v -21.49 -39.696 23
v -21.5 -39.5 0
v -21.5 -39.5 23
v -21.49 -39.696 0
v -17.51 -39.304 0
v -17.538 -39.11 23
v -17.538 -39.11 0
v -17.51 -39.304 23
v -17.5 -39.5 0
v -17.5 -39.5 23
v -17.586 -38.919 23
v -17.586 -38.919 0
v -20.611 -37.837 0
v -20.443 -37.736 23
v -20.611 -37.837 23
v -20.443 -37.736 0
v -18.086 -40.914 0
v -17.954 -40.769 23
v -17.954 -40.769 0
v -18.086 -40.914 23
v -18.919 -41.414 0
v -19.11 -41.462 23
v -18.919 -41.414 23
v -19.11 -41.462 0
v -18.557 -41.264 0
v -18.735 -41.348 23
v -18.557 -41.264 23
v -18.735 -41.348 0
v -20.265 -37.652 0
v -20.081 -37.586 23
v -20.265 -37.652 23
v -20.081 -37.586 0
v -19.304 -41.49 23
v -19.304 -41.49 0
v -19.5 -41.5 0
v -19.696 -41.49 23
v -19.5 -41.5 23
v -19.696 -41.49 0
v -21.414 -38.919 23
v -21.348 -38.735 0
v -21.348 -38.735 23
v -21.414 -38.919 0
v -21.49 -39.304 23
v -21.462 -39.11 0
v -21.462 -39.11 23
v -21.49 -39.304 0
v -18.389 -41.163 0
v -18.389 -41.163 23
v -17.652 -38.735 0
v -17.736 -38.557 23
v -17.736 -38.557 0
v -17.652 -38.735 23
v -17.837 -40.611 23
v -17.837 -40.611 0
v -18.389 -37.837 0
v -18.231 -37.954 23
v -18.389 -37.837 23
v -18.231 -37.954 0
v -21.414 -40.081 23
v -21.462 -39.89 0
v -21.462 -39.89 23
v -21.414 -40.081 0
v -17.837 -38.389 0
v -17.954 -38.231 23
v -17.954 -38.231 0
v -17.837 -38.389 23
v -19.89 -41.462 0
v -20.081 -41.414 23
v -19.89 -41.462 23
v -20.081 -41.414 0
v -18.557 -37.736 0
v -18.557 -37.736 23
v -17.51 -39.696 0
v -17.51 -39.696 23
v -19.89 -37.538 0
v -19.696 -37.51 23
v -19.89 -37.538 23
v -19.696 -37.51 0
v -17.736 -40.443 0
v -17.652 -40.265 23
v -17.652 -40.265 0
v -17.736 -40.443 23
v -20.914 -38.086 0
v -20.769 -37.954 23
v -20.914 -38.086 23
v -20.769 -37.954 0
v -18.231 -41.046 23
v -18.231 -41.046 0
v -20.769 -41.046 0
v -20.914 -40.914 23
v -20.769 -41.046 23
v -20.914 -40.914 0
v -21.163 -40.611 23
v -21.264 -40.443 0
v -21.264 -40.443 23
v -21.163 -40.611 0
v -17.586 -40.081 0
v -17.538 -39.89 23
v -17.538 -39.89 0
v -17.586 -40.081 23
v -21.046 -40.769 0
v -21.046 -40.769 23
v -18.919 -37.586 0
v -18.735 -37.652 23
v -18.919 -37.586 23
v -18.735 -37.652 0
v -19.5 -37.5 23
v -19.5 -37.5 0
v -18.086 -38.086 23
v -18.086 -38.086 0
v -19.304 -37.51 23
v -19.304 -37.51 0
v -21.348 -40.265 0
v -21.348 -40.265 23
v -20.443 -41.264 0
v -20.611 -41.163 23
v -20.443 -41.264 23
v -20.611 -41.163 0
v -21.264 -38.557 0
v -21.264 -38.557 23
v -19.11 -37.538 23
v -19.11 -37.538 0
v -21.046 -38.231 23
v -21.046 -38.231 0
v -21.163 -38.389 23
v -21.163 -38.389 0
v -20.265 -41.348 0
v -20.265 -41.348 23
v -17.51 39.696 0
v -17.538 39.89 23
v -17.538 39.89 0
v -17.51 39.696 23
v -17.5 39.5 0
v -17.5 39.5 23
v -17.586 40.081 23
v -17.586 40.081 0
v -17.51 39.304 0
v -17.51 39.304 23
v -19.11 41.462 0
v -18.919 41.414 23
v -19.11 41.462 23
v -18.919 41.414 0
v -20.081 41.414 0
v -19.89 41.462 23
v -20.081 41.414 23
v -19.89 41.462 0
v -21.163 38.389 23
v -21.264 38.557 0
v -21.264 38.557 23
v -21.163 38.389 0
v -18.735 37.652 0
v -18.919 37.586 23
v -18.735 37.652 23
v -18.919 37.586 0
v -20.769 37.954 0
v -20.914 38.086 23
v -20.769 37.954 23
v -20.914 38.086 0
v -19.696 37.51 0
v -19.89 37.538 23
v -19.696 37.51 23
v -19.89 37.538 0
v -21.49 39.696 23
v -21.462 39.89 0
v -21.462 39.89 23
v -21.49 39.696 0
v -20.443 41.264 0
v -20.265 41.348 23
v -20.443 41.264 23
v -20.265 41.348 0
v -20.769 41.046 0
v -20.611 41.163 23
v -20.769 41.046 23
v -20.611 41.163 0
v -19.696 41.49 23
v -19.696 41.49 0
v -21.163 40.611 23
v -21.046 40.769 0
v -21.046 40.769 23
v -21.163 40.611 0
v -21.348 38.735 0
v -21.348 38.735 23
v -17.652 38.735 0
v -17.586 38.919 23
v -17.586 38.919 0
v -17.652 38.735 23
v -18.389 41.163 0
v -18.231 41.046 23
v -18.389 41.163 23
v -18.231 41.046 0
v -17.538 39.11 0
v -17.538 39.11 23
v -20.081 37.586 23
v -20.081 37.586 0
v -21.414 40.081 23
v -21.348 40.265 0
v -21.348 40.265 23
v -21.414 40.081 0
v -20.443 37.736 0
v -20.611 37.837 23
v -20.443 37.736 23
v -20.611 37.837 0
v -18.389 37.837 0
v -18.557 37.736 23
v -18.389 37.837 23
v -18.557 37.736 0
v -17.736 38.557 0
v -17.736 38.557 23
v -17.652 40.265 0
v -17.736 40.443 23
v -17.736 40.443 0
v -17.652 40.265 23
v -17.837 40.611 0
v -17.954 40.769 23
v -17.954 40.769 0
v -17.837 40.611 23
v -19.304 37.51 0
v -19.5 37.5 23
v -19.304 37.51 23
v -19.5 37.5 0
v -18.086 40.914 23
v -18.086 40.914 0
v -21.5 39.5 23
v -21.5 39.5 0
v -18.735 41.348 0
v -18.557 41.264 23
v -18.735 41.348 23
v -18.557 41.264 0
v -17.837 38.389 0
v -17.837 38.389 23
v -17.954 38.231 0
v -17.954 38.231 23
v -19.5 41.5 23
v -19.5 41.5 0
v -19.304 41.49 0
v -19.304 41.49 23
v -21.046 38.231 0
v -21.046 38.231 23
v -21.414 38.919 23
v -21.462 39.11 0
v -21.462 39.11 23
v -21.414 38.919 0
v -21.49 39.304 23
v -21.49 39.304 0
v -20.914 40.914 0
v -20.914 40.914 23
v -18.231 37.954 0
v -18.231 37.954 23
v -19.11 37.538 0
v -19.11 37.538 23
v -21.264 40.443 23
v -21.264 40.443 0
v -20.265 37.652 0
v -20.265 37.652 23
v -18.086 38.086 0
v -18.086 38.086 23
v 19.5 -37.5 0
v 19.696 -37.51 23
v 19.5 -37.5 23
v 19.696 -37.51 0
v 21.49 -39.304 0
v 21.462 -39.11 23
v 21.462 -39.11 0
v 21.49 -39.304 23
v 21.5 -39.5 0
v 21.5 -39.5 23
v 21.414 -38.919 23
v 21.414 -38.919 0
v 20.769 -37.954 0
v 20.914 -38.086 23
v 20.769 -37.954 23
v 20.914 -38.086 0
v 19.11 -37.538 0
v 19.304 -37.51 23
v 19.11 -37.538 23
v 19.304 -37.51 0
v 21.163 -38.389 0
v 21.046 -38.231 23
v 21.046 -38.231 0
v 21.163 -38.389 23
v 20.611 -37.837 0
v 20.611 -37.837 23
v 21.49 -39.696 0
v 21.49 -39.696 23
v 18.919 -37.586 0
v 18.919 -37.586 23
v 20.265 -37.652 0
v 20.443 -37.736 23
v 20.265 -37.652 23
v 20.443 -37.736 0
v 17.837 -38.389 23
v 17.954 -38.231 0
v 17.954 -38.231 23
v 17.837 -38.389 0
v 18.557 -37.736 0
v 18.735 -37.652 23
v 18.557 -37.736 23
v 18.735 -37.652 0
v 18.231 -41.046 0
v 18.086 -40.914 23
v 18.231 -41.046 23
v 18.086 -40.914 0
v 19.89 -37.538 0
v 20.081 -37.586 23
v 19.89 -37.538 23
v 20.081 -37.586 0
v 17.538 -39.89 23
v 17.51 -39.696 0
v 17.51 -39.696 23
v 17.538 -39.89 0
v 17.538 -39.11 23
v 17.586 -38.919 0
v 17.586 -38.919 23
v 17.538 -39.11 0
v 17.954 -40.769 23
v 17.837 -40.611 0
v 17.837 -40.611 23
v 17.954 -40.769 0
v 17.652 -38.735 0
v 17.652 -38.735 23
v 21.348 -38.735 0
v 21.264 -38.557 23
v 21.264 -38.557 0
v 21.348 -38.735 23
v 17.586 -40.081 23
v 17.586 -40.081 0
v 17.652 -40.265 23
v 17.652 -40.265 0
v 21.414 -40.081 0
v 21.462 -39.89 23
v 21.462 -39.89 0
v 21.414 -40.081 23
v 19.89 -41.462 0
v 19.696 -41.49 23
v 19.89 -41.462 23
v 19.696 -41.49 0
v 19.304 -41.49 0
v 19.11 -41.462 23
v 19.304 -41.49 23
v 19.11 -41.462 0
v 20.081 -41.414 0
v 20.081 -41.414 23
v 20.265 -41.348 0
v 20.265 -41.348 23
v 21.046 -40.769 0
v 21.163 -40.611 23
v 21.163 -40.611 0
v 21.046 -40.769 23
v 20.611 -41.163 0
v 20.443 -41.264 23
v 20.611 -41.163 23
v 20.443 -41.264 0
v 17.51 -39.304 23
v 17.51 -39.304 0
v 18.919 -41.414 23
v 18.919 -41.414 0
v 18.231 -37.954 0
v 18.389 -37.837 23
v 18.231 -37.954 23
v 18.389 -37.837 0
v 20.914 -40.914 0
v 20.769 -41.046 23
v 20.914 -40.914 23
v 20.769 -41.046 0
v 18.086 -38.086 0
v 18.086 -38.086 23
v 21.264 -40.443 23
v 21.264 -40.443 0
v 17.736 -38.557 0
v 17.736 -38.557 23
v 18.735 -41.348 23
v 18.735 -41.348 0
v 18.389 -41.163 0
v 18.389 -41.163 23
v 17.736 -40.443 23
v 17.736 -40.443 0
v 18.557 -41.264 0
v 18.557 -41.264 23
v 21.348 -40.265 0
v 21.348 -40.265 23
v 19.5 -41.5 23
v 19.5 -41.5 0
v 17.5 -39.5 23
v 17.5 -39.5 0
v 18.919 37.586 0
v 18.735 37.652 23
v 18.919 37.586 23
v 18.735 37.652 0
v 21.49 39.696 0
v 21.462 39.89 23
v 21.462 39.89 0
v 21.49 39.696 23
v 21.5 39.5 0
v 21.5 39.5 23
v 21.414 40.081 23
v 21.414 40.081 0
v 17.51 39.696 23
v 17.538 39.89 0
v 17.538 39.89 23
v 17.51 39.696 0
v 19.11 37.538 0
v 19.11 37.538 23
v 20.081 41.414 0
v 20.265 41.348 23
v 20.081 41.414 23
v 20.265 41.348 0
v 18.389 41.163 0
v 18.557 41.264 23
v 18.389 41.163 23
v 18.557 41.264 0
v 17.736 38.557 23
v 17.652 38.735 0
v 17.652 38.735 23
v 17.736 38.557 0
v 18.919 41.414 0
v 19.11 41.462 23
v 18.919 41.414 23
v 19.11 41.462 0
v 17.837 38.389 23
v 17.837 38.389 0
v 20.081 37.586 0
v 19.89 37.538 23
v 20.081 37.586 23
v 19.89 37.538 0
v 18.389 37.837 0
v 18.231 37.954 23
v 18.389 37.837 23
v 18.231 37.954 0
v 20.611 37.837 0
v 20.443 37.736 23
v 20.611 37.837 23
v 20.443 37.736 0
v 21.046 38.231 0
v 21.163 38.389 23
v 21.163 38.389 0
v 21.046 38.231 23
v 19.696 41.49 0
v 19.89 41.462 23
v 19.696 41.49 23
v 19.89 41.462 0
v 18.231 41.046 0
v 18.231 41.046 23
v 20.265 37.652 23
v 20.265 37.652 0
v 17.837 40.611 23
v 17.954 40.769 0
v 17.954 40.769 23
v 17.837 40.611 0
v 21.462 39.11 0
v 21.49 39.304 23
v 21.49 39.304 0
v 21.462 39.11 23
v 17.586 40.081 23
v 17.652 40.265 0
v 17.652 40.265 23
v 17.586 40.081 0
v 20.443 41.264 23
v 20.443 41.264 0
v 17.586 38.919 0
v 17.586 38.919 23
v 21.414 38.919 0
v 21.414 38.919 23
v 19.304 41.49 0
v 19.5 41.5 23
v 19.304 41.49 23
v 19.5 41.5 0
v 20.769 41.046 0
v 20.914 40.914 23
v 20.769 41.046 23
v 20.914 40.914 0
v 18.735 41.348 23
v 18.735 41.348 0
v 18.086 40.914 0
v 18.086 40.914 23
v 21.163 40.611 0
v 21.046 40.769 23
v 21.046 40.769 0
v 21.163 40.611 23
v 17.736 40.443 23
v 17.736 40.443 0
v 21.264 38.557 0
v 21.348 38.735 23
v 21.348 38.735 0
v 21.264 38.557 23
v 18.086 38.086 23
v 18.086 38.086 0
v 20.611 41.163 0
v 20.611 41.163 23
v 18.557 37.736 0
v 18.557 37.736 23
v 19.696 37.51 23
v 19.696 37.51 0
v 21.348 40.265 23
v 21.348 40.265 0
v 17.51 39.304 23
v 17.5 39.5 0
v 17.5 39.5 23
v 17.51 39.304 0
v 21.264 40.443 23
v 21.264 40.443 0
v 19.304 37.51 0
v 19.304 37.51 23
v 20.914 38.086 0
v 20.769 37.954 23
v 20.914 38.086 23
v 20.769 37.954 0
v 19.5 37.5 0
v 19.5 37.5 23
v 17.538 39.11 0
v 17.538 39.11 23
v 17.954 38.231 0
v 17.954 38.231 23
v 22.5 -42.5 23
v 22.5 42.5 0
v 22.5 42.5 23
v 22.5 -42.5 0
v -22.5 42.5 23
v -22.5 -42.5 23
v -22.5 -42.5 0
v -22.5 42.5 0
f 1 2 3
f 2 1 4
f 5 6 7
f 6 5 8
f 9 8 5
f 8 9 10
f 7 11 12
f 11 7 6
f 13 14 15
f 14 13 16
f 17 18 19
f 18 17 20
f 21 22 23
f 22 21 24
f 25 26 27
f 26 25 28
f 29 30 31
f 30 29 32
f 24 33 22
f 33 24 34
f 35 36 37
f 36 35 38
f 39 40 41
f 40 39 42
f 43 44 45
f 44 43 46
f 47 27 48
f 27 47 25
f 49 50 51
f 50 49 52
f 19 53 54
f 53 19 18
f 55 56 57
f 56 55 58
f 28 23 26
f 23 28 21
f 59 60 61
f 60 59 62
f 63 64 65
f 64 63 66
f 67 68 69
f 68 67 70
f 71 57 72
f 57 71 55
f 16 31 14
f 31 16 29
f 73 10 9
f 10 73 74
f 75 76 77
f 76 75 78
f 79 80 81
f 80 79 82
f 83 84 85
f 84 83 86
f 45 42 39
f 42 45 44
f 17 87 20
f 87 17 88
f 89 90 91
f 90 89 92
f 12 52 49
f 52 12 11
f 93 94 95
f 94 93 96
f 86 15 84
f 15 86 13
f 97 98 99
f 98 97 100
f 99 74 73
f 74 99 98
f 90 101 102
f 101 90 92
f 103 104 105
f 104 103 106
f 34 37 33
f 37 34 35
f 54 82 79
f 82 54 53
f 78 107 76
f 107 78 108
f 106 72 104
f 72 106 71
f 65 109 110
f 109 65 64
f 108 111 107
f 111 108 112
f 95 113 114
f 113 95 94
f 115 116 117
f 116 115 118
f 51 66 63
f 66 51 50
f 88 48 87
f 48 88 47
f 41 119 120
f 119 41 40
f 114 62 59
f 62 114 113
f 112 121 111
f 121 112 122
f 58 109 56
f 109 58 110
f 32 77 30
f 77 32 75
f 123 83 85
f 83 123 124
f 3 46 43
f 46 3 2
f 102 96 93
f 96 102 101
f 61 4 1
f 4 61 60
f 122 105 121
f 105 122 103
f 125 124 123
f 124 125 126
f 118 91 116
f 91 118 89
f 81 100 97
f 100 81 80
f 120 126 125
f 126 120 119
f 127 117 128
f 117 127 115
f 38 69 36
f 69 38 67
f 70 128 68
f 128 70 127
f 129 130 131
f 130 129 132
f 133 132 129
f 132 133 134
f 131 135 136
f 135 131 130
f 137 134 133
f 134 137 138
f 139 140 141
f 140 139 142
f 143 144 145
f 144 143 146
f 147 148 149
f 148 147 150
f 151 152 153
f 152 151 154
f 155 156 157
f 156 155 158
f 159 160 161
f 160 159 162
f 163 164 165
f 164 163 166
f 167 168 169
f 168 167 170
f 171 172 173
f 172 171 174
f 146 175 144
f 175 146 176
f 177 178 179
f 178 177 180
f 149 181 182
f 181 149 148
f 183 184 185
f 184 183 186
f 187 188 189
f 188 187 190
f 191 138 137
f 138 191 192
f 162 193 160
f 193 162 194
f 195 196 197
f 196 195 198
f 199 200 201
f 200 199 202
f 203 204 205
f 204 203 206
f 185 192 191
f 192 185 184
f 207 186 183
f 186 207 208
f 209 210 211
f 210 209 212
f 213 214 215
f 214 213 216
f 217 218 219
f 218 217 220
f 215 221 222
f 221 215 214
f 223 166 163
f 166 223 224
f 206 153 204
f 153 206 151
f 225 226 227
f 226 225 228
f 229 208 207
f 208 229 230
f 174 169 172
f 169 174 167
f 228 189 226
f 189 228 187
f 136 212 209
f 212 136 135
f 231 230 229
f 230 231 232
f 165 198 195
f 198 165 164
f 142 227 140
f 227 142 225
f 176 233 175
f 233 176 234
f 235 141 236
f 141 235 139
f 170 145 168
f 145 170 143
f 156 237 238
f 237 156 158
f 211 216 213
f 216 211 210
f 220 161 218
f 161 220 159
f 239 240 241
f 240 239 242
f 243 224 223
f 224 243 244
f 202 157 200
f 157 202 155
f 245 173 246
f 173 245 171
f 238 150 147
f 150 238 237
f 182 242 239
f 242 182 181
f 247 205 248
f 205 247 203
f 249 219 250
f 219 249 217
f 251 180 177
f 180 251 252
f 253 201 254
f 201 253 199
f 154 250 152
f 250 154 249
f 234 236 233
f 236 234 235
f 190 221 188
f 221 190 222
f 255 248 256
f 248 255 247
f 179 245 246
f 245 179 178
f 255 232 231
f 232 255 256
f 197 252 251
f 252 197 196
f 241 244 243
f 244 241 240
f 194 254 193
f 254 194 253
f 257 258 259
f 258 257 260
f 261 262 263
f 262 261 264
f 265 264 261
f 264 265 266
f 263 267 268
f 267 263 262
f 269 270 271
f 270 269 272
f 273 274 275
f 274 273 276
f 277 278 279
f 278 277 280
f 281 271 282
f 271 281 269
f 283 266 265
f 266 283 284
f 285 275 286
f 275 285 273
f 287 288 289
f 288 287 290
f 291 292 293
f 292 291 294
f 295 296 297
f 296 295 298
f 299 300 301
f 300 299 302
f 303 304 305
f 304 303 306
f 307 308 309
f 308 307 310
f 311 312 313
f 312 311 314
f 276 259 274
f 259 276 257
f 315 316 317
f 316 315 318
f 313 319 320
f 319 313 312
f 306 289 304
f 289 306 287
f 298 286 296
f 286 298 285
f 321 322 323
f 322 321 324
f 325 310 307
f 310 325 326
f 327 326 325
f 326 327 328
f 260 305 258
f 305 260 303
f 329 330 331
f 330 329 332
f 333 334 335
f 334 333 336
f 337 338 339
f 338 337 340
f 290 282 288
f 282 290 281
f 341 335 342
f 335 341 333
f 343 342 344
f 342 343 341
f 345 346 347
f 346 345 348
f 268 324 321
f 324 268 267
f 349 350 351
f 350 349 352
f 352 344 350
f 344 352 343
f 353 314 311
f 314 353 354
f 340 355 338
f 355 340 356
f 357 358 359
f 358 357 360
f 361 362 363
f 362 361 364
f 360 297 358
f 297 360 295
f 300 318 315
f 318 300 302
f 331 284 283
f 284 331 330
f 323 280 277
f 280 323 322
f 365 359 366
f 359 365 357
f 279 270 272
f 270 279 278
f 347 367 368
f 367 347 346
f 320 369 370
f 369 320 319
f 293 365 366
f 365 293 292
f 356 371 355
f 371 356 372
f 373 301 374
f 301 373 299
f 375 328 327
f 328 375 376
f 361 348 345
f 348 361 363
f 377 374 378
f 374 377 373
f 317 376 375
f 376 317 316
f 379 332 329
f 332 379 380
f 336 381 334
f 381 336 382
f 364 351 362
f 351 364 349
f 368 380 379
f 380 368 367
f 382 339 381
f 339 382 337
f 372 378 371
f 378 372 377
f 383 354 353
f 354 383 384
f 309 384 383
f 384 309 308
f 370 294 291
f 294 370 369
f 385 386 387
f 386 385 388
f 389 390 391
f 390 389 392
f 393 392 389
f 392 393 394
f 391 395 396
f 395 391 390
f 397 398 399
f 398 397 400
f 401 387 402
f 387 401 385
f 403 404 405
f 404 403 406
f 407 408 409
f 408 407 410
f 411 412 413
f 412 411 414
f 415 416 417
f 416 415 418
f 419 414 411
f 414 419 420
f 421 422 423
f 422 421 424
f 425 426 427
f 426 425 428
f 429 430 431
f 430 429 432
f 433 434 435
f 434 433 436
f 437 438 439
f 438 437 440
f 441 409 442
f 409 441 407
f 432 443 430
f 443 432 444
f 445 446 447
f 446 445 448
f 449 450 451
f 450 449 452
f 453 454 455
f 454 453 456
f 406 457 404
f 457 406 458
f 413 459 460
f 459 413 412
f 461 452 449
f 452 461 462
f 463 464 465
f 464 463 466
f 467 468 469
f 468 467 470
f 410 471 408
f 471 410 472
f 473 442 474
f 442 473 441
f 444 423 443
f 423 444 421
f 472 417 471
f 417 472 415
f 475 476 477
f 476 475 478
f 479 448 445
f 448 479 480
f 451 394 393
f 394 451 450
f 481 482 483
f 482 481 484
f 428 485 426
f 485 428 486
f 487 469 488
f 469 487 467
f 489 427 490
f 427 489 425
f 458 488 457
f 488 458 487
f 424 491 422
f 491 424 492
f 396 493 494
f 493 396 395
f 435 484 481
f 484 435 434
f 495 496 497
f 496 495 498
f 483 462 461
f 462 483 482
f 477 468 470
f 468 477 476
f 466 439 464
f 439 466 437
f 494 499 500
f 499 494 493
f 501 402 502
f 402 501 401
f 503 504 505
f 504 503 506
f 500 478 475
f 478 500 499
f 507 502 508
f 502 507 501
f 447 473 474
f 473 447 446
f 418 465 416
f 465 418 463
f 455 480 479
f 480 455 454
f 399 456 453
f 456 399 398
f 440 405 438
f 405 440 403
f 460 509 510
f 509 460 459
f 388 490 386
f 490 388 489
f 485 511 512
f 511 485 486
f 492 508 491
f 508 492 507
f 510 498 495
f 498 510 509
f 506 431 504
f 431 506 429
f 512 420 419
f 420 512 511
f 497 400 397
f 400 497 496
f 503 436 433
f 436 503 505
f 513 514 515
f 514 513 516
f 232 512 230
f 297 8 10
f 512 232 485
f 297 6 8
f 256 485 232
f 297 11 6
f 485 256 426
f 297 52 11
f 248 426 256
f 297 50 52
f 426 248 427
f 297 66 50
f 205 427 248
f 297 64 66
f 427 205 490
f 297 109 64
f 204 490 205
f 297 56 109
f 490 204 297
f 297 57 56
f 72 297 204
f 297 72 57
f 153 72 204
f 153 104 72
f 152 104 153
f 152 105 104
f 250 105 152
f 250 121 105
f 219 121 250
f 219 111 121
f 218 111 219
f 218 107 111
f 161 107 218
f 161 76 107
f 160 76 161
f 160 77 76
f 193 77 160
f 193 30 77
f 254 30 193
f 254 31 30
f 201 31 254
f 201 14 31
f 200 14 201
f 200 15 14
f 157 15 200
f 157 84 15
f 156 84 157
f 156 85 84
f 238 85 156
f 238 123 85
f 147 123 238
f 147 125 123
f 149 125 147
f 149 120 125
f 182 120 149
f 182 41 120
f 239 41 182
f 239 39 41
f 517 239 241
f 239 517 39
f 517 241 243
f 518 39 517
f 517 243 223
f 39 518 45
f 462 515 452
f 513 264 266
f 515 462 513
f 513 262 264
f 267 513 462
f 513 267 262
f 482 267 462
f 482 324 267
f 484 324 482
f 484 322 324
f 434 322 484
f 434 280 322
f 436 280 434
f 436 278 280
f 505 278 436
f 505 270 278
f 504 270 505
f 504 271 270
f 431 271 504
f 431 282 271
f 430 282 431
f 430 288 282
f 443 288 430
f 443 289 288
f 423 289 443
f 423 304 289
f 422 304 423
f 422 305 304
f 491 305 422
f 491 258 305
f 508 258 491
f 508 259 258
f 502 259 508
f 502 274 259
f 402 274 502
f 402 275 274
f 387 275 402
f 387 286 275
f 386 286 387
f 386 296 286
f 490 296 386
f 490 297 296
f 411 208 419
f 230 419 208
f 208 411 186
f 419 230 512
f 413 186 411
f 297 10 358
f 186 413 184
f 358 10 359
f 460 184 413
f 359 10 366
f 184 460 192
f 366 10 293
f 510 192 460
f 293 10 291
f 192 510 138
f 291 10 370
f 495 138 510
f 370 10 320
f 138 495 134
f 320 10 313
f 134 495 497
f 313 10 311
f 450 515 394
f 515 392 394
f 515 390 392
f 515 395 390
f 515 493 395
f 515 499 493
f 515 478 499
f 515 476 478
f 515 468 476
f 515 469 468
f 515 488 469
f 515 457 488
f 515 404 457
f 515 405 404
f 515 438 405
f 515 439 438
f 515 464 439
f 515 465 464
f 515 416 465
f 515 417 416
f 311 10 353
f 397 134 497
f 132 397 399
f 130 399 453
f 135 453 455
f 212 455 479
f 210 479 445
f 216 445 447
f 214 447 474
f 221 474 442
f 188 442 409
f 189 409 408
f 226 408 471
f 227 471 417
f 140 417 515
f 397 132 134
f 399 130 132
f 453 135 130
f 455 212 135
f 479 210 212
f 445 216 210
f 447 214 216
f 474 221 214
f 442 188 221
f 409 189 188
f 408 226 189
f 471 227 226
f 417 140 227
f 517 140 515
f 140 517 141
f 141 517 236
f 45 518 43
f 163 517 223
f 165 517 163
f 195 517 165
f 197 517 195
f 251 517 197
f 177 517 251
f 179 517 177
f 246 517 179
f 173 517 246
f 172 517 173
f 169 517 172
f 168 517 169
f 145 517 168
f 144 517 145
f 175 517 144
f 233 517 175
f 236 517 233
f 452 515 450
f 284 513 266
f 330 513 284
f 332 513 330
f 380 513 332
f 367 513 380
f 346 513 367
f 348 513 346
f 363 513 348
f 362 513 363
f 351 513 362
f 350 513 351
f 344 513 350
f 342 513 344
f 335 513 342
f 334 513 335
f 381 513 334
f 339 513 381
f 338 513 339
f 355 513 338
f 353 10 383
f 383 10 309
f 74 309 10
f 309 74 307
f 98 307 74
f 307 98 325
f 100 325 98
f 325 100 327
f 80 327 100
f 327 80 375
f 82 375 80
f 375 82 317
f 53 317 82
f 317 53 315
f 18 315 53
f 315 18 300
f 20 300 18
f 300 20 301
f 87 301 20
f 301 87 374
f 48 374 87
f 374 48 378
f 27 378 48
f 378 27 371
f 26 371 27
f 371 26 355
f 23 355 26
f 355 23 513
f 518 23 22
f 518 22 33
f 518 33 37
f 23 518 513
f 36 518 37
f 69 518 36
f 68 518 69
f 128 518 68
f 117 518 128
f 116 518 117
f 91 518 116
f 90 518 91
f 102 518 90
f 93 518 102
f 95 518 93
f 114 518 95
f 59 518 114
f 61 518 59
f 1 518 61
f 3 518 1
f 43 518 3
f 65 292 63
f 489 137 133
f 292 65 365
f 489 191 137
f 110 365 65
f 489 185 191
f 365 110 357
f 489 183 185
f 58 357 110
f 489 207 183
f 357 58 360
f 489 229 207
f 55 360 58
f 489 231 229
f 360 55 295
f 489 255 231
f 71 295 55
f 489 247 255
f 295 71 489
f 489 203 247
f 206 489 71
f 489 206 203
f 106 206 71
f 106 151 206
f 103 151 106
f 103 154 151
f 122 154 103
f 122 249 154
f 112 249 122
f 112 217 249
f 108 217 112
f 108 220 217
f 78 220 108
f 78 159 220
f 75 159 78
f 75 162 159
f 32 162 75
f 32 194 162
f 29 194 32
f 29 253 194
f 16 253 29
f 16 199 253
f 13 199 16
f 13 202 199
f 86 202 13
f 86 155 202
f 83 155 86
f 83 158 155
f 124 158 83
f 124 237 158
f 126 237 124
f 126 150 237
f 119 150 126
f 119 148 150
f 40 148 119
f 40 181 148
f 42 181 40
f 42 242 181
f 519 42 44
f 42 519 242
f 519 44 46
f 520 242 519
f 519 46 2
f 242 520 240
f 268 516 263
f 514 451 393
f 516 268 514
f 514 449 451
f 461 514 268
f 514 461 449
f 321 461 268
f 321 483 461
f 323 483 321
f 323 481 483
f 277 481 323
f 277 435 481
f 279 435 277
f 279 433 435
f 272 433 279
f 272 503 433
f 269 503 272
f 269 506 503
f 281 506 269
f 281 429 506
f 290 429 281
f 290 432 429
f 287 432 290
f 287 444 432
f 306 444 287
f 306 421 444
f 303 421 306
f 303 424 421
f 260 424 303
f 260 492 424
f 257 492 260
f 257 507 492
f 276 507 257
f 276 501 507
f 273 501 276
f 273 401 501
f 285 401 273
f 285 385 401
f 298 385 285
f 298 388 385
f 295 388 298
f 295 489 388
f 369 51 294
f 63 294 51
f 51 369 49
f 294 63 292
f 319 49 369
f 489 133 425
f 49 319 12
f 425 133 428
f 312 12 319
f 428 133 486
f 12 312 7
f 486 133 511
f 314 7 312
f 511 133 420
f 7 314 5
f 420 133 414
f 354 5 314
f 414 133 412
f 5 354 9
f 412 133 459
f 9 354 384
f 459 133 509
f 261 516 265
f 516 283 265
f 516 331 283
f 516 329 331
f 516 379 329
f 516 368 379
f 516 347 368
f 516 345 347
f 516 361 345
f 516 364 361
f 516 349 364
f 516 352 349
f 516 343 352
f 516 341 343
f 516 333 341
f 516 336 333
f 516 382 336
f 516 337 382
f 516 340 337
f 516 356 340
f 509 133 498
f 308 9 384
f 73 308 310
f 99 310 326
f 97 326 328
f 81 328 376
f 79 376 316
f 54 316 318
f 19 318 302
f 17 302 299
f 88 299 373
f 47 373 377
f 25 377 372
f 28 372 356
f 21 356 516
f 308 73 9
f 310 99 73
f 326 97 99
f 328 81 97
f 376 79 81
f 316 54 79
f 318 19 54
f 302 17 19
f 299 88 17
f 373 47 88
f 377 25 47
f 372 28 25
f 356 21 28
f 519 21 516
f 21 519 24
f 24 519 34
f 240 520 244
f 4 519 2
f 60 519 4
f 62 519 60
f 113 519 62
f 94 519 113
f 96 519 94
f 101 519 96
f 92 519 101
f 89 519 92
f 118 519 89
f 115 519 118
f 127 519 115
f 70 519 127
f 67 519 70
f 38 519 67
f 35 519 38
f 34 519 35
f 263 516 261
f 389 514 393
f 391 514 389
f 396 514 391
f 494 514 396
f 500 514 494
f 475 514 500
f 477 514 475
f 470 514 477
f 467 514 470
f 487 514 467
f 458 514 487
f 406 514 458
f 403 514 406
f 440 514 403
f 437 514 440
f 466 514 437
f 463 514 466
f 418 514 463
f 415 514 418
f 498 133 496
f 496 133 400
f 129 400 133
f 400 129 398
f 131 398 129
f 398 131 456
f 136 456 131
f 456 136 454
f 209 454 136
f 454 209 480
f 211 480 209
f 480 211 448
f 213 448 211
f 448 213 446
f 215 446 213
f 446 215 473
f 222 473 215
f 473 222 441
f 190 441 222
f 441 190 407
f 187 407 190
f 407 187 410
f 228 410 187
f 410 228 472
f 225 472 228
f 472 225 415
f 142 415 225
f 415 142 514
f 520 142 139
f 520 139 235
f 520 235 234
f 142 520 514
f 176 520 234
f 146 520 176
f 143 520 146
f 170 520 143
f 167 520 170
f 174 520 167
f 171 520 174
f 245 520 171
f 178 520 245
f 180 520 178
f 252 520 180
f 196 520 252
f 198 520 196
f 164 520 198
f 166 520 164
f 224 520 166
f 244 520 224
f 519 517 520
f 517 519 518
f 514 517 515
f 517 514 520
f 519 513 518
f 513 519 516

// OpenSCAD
module Vesc()
{
  $fn = 64;

  body_dimensions = [45, 85, 23];
  mounting_hole_centres = [39, 79];

  difference()
  {
    translate([0, 0, body_dimensions[2]/2])
    {
      cube(body_dimensions, center=true);
    }

    for(x=[-mounting_hole_centres[0]/2, mounting_hole_centres[0]/2])
    {
      for(y=[-mounting_hole_centres[1]/2, mounting_hole_centres[1]/2])
      {
        translate([x, y, -1])
        {
          cylinder(d=4, h=body_dimensions[2]+2);
        }
      }
    }
  }
}

Vesc();
